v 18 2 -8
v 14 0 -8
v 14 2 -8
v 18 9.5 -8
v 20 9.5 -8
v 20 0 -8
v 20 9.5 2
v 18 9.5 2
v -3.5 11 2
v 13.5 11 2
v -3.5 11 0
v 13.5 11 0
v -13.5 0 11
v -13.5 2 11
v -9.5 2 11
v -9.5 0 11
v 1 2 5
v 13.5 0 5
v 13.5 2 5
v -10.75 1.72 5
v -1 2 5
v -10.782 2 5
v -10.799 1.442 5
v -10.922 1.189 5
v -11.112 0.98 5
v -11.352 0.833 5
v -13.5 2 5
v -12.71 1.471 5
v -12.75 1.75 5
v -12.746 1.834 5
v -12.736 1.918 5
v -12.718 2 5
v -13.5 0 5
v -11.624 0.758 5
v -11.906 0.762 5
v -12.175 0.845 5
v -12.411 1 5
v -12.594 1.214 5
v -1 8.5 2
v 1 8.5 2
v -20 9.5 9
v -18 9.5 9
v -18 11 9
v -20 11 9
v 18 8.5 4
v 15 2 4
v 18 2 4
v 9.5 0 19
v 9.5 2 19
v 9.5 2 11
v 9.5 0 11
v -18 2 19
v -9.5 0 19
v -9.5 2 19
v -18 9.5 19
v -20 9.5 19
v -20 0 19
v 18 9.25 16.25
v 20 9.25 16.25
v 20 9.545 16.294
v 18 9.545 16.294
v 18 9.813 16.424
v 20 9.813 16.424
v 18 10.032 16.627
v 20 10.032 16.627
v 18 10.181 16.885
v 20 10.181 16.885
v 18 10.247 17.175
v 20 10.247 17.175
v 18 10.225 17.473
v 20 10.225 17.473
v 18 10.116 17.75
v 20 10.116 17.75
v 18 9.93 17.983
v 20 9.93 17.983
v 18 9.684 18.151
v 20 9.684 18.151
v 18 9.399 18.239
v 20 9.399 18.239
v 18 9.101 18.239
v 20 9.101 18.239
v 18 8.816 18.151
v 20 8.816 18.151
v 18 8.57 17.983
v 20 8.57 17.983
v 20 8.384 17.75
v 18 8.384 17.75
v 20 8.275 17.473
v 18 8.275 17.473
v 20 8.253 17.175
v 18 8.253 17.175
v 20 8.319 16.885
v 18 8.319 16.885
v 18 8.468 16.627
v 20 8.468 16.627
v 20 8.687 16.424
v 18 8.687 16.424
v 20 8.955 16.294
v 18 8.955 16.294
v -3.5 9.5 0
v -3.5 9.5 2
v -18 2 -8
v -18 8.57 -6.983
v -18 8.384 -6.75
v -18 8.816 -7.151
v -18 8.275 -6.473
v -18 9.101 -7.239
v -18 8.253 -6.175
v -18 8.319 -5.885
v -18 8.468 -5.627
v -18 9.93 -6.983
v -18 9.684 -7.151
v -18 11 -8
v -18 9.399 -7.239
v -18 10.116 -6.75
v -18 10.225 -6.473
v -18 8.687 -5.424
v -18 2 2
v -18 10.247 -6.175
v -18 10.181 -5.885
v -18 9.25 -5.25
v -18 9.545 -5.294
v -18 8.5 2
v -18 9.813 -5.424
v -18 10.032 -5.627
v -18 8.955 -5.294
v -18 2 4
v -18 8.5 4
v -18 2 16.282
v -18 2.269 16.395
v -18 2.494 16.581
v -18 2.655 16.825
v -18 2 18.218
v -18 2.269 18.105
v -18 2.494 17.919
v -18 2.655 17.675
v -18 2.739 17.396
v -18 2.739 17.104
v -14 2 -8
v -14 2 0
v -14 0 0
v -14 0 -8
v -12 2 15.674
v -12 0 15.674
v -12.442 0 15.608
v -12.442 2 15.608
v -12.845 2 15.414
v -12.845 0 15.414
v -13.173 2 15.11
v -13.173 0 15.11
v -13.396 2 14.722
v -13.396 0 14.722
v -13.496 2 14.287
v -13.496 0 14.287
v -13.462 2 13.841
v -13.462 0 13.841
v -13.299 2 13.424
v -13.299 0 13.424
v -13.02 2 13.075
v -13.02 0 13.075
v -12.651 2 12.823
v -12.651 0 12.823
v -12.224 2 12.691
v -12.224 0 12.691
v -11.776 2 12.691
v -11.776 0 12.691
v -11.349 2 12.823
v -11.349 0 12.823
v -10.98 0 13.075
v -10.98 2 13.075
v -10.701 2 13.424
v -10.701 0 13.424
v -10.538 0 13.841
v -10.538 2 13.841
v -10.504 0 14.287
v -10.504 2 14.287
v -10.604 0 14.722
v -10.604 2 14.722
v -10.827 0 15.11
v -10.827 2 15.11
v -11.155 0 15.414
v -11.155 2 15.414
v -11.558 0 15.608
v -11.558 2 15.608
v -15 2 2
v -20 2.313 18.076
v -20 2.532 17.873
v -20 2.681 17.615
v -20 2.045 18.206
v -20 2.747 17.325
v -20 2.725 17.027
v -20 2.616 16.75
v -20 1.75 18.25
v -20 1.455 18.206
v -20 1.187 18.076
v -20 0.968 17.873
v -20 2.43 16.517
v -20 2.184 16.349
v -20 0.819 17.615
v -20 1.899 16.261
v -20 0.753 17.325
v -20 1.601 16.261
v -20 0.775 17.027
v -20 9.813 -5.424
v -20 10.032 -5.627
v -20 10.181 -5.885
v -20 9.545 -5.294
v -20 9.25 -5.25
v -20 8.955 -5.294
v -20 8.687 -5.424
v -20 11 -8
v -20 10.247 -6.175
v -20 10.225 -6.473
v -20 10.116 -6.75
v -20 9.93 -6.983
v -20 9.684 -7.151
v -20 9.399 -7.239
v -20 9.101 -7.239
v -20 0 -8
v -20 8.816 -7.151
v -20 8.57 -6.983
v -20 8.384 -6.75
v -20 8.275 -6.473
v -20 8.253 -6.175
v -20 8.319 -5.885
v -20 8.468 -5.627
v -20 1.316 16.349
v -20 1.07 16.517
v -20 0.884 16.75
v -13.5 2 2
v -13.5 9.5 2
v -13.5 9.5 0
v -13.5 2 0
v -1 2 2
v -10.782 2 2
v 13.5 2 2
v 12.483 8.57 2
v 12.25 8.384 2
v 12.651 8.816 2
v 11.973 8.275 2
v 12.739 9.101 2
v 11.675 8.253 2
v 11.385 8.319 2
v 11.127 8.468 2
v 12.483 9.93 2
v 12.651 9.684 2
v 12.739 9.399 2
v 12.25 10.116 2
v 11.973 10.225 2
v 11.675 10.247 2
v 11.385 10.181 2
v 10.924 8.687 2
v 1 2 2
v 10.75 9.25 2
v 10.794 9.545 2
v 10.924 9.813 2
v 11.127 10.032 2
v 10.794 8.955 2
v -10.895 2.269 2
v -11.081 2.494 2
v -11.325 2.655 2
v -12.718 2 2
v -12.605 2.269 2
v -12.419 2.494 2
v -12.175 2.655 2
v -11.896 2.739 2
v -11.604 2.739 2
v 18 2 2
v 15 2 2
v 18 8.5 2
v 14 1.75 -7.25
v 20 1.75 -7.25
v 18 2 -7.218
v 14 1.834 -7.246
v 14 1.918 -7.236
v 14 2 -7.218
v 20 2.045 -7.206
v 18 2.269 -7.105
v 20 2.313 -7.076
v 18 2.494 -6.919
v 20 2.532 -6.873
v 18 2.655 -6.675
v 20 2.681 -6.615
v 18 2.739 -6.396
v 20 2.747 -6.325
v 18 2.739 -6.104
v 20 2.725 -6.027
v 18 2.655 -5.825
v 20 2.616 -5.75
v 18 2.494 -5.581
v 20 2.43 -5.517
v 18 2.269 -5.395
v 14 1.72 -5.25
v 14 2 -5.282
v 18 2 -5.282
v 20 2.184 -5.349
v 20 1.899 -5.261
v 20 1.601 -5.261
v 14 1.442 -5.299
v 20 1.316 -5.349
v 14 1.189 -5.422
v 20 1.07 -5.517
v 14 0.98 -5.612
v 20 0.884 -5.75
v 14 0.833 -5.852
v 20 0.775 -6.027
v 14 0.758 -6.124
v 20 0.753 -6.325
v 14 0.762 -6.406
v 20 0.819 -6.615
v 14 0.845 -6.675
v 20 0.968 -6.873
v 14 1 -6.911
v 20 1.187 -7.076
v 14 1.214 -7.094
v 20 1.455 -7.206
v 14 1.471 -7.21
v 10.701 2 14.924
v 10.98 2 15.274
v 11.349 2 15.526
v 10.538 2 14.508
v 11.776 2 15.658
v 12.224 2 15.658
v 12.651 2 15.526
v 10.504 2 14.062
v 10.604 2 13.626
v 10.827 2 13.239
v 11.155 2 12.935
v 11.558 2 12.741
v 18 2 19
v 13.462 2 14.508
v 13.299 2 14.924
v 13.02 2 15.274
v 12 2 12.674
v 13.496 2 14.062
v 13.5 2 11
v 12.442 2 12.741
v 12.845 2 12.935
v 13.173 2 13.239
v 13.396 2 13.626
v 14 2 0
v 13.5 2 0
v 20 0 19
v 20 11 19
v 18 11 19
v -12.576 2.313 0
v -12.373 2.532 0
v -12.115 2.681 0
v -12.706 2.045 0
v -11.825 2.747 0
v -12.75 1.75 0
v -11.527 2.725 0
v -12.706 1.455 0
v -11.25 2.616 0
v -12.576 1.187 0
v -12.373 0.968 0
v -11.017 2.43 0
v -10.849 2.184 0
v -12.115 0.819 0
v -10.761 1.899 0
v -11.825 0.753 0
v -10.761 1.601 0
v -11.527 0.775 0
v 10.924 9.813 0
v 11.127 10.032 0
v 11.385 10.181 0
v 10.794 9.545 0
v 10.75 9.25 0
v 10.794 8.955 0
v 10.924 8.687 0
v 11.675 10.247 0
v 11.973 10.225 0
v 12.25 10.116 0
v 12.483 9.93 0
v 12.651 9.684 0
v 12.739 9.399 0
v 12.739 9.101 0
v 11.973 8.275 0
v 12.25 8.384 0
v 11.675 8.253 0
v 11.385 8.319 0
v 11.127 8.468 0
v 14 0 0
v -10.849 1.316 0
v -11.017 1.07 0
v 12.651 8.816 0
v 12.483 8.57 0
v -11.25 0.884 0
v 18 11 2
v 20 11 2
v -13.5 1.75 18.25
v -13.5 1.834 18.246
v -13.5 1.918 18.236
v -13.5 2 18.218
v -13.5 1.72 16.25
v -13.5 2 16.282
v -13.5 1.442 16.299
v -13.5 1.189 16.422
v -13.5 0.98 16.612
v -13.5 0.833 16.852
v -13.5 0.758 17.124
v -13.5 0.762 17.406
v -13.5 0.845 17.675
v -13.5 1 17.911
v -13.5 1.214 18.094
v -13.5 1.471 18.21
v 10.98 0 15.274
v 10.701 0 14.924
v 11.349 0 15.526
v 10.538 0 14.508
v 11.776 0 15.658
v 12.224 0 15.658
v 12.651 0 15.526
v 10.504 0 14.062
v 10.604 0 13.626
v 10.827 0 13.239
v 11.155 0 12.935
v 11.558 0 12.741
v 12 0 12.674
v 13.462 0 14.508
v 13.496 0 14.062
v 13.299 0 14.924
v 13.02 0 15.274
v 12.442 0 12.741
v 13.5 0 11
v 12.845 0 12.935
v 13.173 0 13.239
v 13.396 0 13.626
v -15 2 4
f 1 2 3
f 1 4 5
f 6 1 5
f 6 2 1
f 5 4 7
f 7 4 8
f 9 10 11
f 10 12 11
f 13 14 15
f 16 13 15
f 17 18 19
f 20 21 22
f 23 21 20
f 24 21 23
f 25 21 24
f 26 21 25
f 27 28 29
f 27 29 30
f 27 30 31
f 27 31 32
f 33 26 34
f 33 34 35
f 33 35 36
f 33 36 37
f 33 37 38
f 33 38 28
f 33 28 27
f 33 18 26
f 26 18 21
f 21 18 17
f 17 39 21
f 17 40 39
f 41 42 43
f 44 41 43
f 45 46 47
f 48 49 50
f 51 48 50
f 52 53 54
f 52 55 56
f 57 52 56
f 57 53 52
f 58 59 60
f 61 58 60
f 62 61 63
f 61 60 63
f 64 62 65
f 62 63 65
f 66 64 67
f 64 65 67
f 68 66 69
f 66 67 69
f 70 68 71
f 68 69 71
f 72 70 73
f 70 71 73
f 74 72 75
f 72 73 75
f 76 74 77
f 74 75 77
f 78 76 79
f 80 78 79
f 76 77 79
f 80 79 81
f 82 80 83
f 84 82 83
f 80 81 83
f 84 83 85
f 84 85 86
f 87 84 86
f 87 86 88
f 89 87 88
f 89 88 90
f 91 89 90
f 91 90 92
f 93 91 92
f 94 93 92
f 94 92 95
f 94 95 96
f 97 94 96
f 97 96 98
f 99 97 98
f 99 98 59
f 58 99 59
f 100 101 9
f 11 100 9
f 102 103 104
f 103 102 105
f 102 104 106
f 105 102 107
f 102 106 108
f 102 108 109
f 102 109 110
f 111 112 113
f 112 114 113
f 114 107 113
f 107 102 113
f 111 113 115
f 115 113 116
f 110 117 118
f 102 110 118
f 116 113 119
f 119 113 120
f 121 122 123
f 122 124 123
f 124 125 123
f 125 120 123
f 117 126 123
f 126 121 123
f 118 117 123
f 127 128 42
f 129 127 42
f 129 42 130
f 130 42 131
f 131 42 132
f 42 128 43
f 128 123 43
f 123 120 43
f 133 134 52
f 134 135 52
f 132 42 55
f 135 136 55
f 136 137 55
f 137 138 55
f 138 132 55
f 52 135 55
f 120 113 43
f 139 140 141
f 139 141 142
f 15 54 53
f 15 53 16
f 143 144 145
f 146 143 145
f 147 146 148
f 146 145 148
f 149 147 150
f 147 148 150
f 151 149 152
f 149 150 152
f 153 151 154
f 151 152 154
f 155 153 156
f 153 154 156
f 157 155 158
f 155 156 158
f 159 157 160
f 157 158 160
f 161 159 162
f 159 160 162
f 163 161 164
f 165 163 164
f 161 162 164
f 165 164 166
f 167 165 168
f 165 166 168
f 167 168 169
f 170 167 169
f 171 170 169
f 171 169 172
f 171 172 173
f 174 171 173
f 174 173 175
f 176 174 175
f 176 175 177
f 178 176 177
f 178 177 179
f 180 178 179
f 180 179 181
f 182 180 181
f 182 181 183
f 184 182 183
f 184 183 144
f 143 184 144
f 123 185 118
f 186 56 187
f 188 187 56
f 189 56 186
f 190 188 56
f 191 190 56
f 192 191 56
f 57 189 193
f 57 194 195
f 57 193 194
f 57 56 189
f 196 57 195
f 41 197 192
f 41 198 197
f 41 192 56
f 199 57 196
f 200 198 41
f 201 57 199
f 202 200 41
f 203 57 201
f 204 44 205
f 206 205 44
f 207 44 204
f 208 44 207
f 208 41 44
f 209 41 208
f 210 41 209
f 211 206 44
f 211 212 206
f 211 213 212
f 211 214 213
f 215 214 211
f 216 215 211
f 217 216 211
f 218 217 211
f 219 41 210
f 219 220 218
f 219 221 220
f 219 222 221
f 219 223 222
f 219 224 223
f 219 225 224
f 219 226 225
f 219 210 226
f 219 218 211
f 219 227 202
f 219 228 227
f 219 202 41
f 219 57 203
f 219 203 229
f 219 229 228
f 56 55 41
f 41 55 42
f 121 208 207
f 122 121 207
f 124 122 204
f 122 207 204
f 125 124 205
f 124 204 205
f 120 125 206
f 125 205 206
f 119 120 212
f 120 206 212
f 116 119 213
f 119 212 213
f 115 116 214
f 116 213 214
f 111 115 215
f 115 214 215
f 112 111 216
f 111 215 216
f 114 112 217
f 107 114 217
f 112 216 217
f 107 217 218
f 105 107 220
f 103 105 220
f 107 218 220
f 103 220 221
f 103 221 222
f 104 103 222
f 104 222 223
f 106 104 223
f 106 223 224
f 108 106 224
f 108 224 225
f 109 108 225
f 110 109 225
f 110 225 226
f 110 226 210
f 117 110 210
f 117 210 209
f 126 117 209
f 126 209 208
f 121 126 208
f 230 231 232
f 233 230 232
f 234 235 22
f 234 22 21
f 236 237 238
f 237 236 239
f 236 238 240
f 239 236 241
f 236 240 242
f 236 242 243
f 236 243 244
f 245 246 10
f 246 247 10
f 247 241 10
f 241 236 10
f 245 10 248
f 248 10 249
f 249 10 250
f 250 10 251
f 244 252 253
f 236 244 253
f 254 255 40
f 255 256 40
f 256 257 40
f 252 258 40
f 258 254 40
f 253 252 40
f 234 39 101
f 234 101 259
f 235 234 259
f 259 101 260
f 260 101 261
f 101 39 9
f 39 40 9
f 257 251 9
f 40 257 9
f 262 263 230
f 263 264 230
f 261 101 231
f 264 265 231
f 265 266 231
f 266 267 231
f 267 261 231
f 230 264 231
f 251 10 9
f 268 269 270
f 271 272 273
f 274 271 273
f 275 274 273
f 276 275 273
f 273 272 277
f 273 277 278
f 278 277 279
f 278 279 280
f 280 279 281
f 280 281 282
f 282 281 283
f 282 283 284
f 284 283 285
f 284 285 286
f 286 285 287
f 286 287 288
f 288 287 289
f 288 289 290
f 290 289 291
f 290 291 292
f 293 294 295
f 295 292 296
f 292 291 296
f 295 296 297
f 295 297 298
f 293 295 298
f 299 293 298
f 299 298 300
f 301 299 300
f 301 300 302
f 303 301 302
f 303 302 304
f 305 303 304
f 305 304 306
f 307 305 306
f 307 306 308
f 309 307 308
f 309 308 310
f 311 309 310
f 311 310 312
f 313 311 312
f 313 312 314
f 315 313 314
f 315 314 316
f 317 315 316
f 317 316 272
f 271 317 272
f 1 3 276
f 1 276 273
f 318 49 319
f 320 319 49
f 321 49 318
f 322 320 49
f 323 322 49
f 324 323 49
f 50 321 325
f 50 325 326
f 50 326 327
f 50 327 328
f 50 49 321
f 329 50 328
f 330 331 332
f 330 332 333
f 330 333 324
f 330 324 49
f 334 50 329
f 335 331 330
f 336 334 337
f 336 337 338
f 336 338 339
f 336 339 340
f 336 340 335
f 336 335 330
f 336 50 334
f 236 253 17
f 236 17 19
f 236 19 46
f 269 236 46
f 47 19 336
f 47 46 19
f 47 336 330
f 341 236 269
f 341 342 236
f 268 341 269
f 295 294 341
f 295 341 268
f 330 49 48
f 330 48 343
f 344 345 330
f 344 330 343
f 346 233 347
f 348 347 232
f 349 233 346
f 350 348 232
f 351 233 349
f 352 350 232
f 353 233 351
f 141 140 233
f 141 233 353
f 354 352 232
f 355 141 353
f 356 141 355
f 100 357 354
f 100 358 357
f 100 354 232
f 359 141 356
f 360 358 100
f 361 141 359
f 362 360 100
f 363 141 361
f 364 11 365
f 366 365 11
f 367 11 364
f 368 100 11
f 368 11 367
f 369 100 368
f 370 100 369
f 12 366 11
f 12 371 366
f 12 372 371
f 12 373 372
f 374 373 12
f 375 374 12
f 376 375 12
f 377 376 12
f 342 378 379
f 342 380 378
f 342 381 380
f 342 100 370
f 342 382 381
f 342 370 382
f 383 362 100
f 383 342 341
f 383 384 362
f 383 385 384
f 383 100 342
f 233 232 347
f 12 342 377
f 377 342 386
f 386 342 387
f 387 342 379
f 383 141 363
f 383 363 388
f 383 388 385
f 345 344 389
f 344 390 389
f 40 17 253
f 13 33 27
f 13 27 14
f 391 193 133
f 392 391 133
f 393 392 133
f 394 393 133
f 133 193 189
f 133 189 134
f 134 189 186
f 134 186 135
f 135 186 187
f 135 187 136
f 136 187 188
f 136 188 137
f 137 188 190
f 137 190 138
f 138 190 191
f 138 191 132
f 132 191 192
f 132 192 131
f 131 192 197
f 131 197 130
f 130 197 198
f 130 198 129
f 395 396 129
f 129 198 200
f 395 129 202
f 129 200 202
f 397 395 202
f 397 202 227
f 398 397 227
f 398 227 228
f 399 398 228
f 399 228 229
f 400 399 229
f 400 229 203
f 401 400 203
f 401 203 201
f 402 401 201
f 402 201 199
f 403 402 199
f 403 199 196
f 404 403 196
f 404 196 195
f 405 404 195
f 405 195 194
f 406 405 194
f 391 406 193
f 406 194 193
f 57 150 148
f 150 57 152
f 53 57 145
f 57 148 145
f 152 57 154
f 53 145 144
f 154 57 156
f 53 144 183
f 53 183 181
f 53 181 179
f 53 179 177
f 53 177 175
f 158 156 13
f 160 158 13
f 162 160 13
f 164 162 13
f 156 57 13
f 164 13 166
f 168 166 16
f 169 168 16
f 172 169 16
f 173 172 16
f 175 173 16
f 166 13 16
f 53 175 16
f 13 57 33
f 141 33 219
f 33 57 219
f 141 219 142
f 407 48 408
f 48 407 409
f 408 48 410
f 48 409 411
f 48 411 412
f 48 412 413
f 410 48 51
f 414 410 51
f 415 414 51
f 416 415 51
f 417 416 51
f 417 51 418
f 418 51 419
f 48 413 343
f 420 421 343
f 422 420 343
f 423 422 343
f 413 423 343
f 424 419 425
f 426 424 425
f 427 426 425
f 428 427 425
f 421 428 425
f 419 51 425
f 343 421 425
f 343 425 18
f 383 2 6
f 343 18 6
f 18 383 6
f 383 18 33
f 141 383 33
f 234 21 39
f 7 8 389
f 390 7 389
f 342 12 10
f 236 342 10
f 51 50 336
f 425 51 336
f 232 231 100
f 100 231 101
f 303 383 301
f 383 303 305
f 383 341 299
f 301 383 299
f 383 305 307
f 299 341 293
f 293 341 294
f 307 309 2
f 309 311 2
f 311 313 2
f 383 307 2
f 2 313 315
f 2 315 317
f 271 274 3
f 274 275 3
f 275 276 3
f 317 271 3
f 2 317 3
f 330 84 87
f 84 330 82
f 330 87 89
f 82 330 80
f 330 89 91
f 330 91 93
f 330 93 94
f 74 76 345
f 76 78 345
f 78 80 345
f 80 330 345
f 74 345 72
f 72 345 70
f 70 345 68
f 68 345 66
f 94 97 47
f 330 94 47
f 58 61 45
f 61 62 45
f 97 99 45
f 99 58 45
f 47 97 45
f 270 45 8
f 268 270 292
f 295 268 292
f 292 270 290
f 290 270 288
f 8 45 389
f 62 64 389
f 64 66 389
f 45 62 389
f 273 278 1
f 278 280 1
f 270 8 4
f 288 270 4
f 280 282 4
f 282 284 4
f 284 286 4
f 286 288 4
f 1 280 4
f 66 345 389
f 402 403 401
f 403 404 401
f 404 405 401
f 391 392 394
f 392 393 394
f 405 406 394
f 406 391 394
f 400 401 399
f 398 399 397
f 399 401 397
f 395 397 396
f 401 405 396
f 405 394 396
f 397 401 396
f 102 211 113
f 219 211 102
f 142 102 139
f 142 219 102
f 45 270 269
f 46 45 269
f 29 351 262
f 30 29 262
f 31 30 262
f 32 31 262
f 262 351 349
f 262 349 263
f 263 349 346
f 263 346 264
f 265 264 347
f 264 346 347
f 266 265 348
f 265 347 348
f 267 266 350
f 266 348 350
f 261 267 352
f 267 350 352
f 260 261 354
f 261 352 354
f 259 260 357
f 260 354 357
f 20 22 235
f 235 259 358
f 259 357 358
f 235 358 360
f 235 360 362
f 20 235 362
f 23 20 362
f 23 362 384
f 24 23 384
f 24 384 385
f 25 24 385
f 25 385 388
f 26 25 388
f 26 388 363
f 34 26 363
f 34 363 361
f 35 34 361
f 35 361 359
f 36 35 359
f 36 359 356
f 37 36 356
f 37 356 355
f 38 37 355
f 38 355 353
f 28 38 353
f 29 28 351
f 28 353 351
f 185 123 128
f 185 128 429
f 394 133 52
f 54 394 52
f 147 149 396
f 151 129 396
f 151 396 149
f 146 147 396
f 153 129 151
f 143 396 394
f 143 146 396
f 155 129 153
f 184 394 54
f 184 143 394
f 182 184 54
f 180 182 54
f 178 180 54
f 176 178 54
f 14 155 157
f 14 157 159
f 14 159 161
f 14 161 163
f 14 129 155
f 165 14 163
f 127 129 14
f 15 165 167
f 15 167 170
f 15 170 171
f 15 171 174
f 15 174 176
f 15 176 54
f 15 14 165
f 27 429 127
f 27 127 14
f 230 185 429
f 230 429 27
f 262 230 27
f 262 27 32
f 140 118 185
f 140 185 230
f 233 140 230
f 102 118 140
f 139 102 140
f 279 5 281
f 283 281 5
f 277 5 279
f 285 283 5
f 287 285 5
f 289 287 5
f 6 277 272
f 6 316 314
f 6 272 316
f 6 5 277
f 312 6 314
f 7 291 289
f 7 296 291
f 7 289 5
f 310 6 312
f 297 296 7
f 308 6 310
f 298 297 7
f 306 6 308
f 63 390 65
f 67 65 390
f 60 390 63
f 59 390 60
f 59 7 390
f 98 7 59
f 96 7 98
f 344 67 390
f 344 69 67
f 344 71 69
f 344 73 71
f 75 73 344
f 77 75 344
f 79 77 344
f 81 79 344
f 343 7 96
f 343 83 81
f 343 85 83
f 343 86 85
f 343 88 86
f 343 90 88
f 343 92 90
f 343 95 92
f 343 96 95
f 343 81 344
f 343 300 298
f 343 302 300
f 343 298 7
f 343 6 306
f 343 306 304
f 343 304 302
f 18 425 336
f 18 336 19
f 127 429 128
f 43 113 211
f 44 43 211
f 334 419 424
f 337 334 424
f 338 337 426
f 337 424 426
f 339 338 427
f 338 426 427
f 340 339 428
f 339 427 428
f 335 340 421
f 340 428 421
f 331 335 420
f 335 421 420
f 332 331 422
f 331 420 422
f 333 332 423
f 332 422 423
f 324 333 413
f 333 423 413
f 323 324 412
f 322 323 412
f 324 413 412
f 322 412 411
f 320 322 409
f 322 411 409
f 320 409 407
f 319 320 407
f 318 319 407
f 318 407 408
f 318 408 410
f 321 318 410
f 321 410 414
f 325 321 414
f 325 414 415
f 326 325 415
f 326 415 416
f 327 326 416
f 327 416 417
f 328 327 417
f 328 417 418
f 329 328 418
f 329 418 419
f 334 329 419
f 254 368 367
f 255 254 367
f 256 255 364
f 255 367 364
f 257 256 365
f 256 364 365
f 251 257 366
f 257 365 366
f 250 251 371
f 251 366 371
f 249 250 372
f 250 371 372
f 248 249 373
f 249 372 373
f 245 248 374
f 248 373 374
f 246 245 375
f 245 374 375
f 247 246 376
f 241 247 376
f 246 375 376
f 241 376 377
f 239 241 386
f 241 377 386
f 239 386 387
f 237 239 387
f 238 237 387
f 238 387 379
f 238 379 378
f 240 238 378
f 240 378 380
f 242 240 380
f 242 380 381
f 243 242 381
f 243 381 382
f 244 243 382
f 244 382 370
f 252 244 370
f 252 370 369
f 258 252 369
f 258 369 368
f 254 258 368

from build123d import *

# Parameters (mm, degrees)
BOSS_EXTRUDE1_DEPTH = 11
CUT_EXTRUDE1_DEPTH  = 9
SKETCH3_W           = 10
SKETCH3_H           = 1.5
CUT_EXTRUDE2_DEPTH  = 9
SKETCH4_W           = 10
SKETCH4_H           = 1.5
CUT_EXTRUDE3_DEPTH  = 9
SKETCH5_W           = 10
SKETCH5_H           = 1.5
CUT_EXTRUDE4_DEPTH  = 9
SKETCH6_R           = 1
CUT_EXTRUDE5_DEPTH  = 9
SKETCH7_R           = 1
CUT_EXTRUDE6_DEPTH  = 9
SKETCH8_R           = 1
CUT_EXTRUDE10_DEPTH = 9
BOSS_EXTRUDE2_DEPTH = 1
SKETCH11_W          = 0.5
SKETCH11_H          = 8
CUT_EXTRUDE12_DEPTH = 30.017236257
BOSS_EXTRUDE3_DEPTH = 2
SKETCH13_W          = 4
SKETCH13_H          = 8
BOSS_EXTRUDE4_DEPTH = 2
SKETCH14_R          = 1.5
CUT_EXTRUDE13_DEPTH = 10


with BuildPart() as part:
    # Sketch1 → Boss-Extrude1 (new body)
    with BuildSketch(Plane(origin=(0, 0, 0), x_dir=(1, 0, 0), z_dir=(0, 1, 0))):
        Polygon((-13.5, 0), (13.5, 0), (13.5, 8), (20, 8), (20, -19), (13.5, -19), (13.5, -5), (-13.5, -5), (-13.5, -19), (-20, -19), (-20, 8), (-13.5, 8), align=None)
    extrude(amount=BOSS_EXTRUDE1_DEPTH)

    # Sketch2 → Cut-Extrude1 (cut)
    with BuildSketch(Plane(origin=(0, 11, 0), x_dir=(1, 0, 0), z_dir=(0, 1, 0))):
        Polygon((-18, 8), (-18, -19), (-13.5, -19), (-13.5, -5), (13.5, -5), (13.5, -19), (18, -19), (18, 8), (13.5, 8), (13.5, -2), (-13.5, -2), (-13.5, 8), align=None)
    extrude(amount=-CUT_EXTRUDE1_DEPTH, mode=Mode.SUBTRACT)

    # Sketch3 → Cut-Extrude2 (cut)
    with BuildSketch(Plane.XY.offset(2)):
        with Locations((-8.5, 10.25)):
            Rectangle(SKETCH3_W, SKETCH3_H)
    extrude(amount=-CUT_EXTRUDE2_DEPTH, mode=Mode.SUBTRACT)

    # Sketch4 → Cut-Extrude3 (cut)
    with BuildSketch(Plane.ZY.offset(-18)):
        with Locations((-3, 10.25)):
            Rectangle(SKETCH4_W, SKETCH4_H)
    extrude(amount=-CUT_EXTRUDE3_DEPTH, mode=Mode.SUBTRACT)

    # Sketch5 → Cut-Extrude4 (cut)
    with BuildSketch(Plane(origin=(-18, 0, 0), x_dir=(0, 0, -1), z_dir=(1, 0, 0))):
        with Locations((-14, 10.25)):
            Rectangle(SKETCH5_W, SKETCH5_H)
    extrude(amount=-CUT_EXTRUDE4_DEPTH, mode=Mode.SUBTRACT)

    # Sketch6 → Cut-Extrude5 (cut)
    with BuildSketch(Plane(origin=(0, 0, 0), x_dir=(-1, 0, 0), z_dir=(0, 0, -1))):
        with Locations((11.75, 1.75)):
            Circle(SKETCH6_R)
        with Locations((-11.75, 9.25)):
            Circle(SKETCH6_R)
    extrude(amount=-CUT_EXTRUDE5_DEPTH, mode=Mode.SUBTRACT)

    # Sketch7 → Cut-Extrude6 (cut)
    with BuildSketch(Plane(origin=(20, 0, 0), x_dir=(0, 0, -1), z_dir=(1, 0, 0))):
        with Locations((6.25, 1.75)):
            Circle(SKETCH7_R)
        with Locations((-17.25, 9.25)):
            Circle(SKETCH7_R)
    extrude(amount=-CUT_EXTRUDE6_DEPTH, mode=Mode.SUBTRACT)

    # Sketch8 → Cut-Extrude10 (cut)
    with BuildSketch(Plane.ZY.offset(20)):
        with Locations((17.25, 1.75)):
            Circle(SKETCH8_R)
        with Locations((-6.25, 9.25)):
            Circle(SKETCH8_R)
    extrude(amount=-CUT_EXTRUDE10_DEPTH, mode=Mode.SUBTRACT)

    # Sketch10 → Boss-Extrude2 (add, symmetric)
    with BuildSketch(Plane(origin=(0, 0, 0), x_dir=(0, 0, -1), z_dir=(1, 0, 0))):
        Polygon((-5, 2), (-2, 2), (-2, 8.5), align=None)
    extrude(amount=BOSS_EXTRUDE2_DEPTH, both=True)

    # Sketch11 → Cut-Extrude12 (cut, through all)
    with BuildSketch(Plane(origin=(0, 2, 0), x_dir=(1, 0, 0), z_dir=(0, 1, 0))):
        with Locations((-13.75, 4)):
            Rectangle(SKETCH11_W, SKETCH11_H)
        with Locations((13.75, 4)):
            Rectangle(SKETCH11_W, SKETCH11_H)
    extrude(amount=-CUT_EXTRUDE12_DEPTH, mode=Mode.SUBTRACT)

    # Sketch12 → Boss-Extrude3 (add)
    with BuildSketch(Plane.XY.offset(2)):
        Polygon((-18, 8.5), (-15, 2), (-18, 2), align=None)
        Polygon((18, 2), (18, 8.5), (15, 2), align=None)
    extrude(amount=BOSS_EXTRUDE3_DEPTH)

    # Sketch13 → Boss-Extrude4 (add)
    with BuildSketch(Plane(origin=(0, 2, 0), x_dir=(1, 0, 0), z_dir=(0, 1, 0))):
        with Locations((11.5, -15)):
            Rectangle(SKETCH13_W, SKETCH13_H)
        with Locations((-11.5, -15)):
            Rectangle(SKETCH13_W, SKETCH13_H)
    extrude(amount=-BOSS_EXTRUDE4_DEPTH)

    # Sketch14 → Cut-Extrude13 (cut)
    with BuildSketch(Plane(origin=(0, 0, 0), x_dir=(-1, 0, 0), z_dir=(0, -1, 0))):
        with Locations(Location((-12, -14.174463975, 0), (0, 0, 90))):
            Circle(SKETCH14_R)
        with Locations(Location((12, -14.174463975, 0), (0, 0, 270))):
            Circle(SKETCH14_R)
    extrude(amount=-CUT_EXTRUDE13_DEPTH, mode=Mode.SUBTRACT)


solid = part.part
